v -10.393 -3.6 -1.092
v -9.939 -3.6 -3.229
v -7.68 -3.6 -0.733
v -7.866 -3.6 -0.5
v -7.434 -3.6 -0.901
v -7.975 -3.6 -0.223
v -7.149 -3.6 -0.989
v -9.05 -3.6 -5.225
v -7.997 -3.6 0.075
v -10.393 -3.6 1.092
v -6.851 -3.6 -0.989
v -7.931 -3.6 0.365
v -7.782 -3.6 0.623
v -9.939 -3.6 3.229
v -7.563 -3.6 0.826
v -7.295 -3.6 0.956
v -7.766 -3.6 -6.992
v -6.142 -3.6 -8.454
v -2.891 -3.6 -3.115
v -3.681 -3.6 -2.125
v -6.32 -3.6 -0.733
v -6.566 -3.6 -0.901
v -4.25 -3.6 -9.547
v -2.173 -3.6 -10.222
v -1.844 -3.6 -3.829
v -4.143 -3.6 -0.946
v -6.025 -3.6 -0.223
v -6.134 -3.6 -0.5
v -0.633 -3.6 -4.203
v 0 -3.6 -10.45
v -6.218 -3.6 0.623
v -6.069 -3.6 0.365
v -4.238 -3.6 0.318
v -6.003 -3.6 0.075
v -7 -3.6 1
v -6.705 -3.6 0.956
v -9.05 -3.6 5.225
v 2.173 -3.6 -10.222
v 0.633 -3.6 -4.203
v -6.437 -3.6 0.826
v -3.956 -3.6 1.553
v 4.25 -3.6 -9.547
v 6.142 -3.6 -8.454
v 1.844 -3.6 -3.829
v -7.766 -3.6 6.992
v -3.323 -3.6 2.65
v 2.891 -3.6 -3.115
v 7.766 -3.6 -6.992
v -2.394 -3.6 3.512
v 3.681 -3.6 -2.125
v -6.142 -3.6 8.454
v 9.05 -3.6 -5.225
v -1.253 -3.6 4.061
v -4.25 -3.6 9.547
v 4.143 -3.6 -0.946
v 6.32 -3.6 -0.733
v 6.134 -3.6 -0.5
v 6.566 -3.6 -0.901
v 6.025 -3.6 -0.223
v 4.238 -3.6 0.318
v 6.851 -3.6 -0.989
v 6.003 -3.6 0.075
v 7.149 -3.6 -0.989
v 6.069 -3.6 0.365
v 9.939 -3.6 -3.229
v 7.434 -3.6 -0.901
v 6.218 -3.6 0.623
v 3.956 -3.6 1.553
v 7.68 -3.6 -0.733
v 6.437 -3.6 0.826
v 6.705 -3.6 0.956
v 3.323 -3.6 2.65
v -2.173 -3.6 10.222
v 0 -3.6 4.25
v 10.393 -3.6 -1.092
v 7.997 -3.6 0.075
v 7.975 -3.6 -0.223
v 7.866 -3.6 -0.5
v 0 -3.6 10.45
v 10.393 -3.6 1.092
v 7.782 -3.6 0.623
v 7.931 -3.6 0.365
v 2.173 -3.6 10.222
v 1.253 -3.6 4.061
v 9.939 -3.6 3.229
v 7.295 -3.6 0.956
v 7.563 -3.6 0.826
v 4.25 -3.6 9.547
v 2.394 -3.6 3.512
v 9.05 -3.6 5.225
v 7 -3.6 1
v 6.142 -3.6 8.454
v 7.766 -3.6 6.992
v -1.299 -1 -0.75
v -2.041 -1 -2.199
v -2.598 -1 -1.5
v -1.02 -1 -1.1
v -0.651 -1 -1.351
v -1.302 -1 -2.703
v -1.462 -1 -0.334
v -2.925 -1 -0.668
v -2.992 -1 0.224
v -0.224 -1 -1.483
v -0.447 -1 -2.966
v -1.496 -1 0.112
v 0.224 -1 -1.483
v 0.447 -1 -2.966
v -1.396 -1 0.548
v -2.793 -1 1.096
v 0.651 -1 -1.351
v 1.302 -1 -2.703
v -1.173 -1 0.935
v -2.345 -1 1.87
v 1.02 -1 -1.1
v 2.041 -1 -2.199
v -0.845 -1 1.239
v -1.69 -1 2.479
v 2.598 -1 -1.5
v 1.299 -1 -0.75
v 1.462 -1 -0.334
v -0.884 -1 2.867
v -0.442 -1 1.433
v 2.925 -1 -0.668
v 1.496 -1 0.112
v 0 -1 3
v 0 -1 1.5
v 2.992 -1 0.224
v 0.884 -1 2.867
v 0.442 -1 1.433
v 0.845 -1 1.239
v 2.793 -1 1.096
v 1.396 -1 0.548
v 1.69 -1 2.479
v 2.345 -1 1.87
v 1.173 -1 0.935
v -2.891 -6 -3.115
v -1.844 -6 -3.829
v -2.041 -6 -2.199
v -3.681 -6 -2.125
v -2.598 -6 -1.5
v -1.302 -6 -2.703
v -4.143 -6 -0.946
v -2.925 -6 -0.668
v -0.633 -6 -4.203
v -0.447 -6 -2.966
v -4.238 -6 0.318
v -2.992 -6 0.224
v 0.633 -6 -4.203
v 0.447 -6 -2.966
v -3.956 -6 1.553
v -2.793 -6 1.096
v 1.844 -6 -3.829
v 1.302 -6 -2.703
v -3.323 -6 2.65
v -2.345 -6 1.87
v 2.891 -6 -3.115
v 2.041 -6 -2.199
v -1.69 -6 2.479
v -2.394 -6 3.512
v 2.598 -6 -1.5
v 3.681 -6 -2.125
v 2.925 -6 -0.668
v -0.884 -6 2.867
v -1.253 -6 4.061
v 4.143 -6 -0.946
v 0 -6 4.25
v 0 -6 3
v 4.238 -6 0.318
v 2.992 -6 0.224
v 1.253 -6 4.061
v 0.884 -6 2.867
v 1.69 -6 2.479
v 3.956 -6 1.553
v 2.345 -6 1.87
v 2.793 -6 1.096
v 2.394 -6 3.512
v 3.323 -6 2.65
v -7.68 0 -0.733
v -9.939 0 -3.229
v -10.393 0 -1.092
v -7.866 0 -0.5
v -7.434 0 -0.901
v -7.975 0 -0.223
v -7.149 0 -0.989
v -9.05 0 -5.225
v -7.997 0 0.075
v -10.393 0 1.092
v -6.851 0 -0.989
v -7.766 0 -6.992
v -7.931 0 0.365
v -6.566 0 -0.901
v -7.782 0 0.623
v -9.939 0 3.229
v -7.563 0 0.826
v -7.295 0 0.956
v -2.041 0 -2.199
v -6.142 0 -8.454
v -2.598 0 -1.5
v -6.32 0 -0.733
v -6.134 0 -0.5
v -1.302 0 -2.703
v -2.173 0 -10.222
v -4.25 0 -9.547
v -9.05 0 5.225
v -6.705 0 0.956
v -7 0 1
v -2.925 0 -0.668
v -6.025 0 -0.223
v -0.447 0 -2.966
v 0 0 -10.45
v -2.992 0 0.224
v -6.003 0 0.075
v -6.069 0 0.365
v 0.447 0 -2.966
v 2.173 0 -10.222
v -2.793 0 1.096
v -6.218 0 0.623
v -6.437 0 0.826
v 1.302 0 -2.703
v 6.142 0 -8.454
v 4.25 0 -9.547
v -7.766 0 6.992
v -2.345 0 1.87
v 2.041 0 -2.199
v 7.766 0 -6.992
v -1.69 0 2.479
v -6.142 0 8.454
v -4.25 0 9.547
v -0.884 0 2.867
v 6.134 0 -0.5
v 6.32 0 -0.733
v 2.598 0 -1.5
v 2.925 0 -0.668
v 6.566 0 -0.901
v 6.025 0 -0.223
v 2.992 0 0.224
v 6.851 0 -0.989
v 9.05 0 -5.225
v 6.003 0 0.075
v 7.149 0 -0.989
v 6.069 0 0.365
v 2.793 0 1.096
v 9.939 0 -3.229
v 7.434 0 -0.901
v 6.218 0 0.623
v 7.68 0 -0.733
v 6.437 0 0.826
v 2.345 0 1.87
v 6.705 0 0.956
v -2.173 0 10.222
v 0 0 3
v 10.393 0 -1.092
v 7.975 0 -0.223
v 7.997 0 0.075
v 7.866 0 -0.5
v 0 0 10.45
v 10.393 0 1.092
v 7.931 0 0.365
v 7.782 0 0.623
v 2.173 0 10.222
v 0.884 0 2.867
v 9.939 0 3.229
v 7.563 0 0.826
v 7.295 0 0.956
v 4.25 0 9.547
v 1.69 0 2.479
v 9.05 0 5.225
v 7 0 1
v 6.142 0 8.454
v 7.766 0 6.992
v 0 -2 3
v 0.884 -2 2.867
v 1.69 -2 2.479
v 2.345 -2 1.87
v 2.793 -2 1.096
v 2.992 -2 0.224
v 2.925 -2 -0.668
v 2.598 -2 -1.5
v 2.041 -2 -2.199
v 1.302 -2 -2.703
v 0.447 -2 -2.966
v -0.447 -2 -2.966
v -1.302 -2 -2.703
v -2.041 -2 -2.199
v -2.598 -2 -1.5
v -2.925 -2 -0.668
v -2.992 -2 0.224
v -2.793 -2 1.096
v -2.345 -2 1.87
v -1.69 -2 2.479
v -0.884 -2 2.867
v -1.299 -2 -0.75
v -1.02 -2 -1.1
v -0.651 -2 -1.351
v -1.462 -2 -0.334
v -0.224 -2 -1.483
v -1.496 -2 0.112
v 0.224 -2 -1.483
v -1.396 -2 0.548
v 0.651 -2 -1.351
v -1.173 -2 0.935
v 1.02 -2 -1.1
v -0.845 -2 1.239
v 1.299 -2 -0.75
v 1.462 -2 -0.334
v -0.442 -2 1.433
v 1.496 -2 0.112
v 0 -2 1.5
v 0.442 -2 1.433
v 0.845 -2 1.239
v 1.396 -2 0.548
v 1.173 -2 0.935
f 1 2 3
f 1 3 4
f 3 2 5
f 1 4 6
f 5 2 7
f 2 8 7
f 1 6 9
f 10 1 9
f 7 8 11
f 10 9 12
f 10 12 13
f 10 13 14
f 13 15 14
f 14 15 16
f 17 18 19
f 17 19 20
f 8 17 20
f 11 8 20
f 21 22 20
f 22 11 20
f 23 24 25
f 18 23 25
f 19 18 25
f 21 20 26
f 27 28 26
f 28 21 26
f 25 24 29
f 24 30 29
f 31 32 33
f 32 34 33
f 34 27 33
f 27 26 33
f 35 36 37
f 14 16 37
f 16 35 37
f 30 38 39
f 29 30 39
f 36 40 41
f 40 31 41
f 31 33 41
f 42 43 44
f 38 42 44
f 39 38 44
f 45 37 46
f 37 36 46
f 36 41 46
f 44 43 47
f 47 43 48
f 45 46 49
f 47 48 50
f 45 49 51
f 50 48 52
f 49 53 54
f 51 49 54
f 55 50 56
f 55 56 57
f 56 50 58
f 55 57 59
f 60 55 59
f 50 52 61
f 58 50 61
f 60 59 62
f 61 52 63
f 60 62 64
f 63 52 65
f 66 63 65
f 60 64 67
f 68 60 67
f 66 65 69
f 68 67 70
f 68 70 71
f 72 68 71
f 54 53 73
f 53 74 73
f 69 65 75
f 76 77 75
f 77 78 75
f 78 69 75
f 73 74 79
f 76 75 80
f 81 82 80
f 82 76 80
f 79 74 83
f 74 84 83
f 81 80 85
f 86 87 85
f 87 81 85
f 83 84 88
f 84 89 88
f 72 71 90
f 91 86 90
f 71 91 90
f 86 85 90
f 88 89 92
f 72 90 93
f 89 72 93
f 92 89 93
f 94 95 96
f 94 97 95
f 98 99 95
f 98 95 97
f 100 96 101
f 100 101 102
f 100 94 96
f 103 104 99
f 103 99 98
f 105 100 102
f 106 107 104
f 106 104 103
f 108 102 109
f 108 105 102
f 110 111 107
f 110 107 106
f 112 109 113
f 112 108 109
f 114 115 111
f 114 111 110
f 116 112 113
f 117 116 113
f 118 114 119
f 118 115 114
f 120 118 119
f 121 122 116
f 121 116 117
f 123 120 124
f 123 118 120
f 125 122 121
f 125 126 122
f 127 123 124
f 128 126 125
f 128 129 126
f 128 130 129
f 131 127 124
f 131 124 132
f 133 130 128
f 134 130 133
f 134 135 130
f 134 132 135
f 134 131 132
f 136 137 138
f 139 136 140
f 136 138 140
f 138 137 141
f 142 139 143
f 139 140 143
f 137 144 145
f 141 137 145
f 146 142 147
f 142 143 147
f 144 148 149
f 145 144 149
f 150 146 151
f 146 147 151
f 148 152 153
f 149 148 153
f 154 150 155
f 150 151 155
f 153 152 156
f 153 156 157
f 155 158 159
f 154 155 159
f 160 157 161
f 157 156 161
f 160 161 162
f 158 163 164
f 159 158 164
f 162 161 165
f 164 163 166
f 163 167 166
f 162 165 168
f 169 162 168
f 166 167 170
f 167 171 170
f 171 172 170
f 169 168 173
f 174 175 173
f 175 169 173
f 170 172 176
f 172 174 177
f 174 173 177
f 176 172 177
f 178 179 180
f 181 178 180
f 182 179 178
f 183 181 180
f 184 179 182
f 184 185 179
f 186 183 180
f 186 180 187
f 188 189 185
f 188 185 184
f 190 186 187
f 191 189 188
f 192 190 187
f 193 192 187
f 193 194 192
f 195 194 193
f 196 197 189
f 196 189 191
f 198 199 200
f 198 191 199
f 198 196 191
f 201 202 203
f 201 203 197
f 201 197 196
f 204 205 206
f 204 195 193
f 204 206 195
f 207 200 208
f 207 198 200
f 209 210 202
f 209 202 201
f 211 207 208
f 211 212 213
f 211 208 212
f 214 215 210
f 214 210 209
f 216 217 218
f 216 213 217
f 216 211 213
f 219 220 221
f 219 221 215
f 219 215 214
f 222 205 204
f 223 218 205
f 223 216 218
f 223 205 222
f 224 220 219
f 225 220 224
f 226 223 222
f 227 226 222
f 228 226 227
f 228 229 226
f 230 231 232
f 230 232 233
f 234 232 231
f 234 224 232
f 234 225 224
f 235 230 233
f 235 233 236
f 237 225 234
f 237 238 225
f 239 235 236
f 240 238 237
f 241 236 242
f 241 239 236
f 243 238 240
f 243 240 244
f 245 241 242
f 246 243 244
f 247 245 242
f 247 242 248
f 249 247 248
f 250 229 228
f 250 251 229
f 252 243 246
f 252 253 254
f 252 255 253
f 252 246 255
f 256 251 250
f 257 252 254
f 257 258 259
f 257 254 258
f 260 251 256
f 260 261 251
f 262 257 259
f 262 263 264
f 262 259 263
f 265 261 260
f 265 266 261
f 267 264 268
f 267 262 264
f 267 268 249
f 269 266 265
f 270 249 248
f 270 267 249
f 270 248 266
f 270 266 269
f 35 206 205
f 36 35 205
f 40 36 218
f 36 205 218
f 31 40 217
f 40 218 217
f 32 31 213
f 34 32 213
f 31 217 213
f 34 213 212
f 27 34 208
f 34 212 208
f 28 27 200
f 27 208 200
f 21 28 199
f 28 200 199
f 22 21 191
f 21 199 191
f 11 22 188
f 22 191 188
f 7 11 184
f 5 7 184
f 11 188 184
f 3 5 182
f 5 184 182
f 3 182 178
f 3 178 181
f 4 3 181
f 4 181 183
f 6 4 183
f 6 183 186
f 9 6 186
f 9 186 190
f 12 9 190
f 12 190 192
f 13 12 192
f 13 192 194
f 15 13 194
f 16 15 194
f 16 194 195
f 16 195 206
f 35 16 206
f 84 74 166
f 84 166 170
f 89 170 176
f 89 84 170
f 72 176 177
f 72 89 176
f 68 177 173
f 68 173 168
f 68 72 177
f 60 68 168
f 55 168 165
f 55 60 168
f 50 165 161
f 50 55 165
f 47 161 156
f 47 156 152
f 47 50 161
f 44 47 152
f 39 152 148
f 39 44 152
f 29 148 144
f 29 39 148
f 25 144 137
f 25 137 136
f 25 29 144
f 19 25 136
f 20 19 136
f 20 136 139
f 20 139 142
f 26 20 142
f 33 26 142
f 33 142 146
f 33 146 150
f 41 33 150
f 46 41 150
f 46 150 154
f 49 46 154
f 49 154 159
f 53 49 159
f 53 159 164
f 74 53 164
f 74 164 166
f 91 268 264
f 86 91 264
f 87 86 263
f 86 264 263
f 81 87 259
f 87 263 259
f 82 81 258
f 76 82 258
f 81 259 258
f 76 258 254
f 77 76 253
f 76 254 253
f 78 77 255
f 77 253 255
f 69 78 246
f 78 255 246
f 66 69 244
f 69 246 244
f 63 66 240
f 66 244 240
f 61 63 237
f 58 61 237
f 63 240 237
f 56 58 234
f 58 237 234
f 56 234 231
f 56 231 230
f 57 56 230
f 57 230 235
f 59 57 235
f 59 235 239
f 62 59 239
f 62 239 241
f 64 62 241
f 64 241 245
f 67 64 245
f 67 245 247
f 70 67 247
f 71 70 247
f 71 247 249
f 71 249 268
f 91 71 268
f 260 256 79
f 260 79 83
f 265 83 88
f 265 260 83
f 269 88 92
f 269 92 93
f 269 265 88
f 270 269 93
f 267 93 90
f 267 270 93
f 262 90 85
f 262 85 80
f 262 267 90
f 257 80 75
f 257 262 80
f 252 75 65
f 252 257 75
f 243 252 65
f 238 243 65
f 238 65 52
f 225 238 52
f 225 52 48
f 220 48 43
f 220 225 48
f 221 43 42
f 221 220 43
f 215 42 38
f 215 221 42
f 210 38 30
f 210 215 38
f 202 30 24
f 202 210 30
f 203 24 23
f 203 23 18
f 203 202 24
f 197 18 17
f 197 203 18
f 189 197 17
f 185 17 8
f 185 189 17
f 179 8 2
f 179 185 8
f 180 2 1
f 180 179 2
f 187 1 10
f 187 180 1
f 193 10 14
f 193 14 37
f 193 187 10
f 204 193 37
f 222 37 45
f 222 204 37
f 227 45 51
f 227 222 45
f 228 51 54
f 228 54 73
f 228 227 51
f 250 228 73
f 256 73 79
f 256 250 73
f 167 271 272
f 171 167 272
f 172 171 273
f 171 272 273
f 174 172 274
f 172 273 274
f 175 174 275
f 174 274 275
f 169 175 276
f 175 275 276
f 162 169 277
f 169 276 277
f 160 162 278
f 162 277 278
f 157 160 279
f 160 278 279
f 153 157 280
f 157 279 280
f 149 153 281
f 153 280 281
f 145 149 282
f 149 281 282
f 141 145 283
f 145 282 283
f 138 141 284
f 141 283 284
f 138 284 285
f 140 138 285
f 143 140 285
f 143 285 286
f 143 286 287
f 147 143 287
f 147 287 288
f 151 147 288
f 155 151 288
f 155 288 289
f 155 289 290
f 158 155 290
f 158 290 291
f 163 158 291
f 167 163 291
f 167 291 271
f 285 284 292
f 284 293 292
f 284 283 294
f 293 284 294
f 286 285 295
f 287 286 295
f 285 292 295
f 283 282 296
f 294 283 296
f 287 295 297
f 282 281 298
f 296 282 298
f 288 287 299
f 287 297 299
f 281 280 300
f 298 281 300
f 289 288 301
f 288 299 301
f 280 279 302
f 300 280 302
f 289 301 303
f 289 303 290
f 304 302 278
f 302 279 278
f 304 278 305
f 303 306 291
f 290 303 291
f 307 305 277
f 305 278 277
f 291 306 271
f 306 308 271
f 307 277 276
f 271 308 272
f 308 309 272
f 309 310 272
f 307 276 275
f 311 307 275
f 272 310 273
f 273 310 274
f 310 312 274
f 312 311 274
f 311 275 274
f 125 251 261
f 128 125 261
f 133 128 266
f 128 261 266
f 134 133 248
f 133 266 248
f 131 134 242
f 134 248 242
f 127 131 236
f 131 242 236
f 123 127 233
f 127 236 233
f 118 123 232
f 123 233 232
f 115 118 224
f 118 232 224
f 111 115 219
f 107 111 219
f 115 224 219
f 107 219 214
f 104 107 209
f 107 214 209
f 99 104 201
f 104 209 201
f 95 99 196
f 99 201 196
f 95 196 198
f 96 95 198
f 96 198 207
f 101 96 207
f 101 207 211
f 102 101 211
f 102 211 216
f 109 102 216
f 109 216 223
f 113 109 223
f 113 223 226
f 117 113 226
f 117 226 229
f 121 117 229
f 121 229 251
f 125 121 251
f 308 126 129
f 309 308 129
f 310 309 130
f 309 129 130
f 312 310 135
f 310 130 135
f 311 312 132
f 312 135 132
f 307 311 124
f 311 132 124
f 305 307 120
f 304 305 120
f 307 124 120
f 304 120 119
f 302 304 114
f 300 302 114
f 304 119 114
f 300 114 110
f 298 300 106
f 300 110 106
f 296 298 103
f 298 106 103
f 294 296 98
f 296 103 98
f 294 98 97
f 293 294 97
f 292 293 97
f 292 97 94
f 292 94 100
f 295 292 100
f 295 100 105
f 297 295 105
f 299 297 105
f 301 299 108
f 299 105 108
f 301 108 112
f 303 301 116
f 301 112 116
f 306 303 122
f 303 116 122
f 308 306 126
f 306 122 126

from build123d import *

# Parameters (mm, degrees)
CROQUIS1_R              = 10.45
CROQUIS1_R_2            = 4.25
SALIENTE_EXTRUIR1_DEPTH = 3.6
CROQUIS1_3_R            = 4.25
CROQUIS1_3_R_2          = 3
SALIENTE_EXTRUIR2_DEPTH = 6
CORTAR_EXTRUIR1_REACH   = 17.95
CROQUIS3_R              = 1
SALIENTE_EXTRUIR3_START = -1
CROQUIS4_R              = 3
SALIENTE_EXTRUIR3_DEPTH = 1
CROQUIS5_R              = 1.5
CORTAR_EXTRUIR2_DEPTH   = 1


with BuildPart() as part:
    # Croquis1 → Saliente-Extruir1 (new body)
    with BuildSketch(Plane(origin=(0, 0, 0), x_dir=(1, 0, 0), z_dir=(0, 1, 0))):
        with Locations(Location((0, 0, 0), (0, 0, 270))):
            Circle(CROQUIS1_R)
        with Locations(Location((0, 0, 0), (0, 0, 270))):
            Circle(CROQUIS1_R_2, mode=Mode.SUBTRACT)
    extrude(amount=-SALIENTE_EXTRUIR1_DEPTH)

    # Croquis1<3> → Saliente-Extruir2 (add)
    with BuildSketch(Plane(origin=(0, 0, 0), x_dir=(1, 0, 0), z_dir=(0, 1, 0))):
        with Locations(Location((0, 0, 0), (0, 0, 270))):
            Circle(CROQUIS1_3_R)
        with Locations(Location((0, 0, 0), (0, 0, 270))):
            Circle(CROQUIS1_3_R_2, mode=Mode.SUBTRACT)
    extrude(amount=-SALIENTE_EXTRUIR2_DEPTH)

    # Croquis3 → Cortar-Extruir1 (cut, up to next)
    with BuildSketch(Plane(origin=(0, 0, 0), x_dir=(1, 0, 0), z_dir=(0, 1, 0)), mode=Mode.PRIVATE) as cortar_extruir1_sk1:
        with Locations(Location((7, 0, 0), (0, 0, 270))):
            Circle(CROQUIS3_R)
    cortar_extruir1_tool1 = extrude(cortar_extruir1_sk1.sketch, amount=-CORTAR_EXTRUIR1_REACH, mode=Mode.PRIVATE) & part.part
    # Croquis3 → Cortar-Extruir1 (cut, up to next)
    with BuildSketch(Plane(origin=(0, 0, 0), x_dir=(1, 0, 0), z_dir=(0, 1, 0)), mode=Mode.PRIVATE) as cortar_extruir1_sk2:
        with Locations(Location((-7, 0, 0), (0, 0, 270))):
            Circle(CROQUIS3_R)
    cortar_extruir1_tool2 = extrude(cortar_extruir1_sk2.sketch, amount=-CORTAR_EXTRUIR1_REACH, mode=Mode.PRIVATE) & part.part
    add(cortar_extruir1_tool1.solids().sort_by_distance((7, 0, 0))[0], mode=Mode.SUBTRACT)
    add(cortar_extruir1_tool2.solids().sort_by_distance((-7, 0, 0))[0], mode=Mode.SUBTRACT)

    # Croquis4 → Saliente-Extruir3 (add)
    with BuildSketch(Plane(origin=(0, 0, 0), x_dir=(1, 0, 0), z_dir=(0, 1, 0)).offset(SALIENTE_EXTRUIR3_START)):
        with Locations(Location((0, 0, 0), (0, 0, 270))):
            Circle(CROQUIS4_R)
    extrude(amount=-SALIENTE_EXTRUIR3_DEPTH)

    # Croquis5 → Cortar-Extruir2 (cut)
    with BuildSketch(Plane(origin=(0, -1, 0), x_dir=(1, 0, 0), z_dir=(0, 1, 0))):
        with Locations(Location((0, 0, 0), (0, 0, 270))):
            Circle(CROQUIS5_R)
    extrude(amount=-CORTAR_EXTRUIR2_DEPTH, mode=Mode.SUBTRACT)


solid = part.part
